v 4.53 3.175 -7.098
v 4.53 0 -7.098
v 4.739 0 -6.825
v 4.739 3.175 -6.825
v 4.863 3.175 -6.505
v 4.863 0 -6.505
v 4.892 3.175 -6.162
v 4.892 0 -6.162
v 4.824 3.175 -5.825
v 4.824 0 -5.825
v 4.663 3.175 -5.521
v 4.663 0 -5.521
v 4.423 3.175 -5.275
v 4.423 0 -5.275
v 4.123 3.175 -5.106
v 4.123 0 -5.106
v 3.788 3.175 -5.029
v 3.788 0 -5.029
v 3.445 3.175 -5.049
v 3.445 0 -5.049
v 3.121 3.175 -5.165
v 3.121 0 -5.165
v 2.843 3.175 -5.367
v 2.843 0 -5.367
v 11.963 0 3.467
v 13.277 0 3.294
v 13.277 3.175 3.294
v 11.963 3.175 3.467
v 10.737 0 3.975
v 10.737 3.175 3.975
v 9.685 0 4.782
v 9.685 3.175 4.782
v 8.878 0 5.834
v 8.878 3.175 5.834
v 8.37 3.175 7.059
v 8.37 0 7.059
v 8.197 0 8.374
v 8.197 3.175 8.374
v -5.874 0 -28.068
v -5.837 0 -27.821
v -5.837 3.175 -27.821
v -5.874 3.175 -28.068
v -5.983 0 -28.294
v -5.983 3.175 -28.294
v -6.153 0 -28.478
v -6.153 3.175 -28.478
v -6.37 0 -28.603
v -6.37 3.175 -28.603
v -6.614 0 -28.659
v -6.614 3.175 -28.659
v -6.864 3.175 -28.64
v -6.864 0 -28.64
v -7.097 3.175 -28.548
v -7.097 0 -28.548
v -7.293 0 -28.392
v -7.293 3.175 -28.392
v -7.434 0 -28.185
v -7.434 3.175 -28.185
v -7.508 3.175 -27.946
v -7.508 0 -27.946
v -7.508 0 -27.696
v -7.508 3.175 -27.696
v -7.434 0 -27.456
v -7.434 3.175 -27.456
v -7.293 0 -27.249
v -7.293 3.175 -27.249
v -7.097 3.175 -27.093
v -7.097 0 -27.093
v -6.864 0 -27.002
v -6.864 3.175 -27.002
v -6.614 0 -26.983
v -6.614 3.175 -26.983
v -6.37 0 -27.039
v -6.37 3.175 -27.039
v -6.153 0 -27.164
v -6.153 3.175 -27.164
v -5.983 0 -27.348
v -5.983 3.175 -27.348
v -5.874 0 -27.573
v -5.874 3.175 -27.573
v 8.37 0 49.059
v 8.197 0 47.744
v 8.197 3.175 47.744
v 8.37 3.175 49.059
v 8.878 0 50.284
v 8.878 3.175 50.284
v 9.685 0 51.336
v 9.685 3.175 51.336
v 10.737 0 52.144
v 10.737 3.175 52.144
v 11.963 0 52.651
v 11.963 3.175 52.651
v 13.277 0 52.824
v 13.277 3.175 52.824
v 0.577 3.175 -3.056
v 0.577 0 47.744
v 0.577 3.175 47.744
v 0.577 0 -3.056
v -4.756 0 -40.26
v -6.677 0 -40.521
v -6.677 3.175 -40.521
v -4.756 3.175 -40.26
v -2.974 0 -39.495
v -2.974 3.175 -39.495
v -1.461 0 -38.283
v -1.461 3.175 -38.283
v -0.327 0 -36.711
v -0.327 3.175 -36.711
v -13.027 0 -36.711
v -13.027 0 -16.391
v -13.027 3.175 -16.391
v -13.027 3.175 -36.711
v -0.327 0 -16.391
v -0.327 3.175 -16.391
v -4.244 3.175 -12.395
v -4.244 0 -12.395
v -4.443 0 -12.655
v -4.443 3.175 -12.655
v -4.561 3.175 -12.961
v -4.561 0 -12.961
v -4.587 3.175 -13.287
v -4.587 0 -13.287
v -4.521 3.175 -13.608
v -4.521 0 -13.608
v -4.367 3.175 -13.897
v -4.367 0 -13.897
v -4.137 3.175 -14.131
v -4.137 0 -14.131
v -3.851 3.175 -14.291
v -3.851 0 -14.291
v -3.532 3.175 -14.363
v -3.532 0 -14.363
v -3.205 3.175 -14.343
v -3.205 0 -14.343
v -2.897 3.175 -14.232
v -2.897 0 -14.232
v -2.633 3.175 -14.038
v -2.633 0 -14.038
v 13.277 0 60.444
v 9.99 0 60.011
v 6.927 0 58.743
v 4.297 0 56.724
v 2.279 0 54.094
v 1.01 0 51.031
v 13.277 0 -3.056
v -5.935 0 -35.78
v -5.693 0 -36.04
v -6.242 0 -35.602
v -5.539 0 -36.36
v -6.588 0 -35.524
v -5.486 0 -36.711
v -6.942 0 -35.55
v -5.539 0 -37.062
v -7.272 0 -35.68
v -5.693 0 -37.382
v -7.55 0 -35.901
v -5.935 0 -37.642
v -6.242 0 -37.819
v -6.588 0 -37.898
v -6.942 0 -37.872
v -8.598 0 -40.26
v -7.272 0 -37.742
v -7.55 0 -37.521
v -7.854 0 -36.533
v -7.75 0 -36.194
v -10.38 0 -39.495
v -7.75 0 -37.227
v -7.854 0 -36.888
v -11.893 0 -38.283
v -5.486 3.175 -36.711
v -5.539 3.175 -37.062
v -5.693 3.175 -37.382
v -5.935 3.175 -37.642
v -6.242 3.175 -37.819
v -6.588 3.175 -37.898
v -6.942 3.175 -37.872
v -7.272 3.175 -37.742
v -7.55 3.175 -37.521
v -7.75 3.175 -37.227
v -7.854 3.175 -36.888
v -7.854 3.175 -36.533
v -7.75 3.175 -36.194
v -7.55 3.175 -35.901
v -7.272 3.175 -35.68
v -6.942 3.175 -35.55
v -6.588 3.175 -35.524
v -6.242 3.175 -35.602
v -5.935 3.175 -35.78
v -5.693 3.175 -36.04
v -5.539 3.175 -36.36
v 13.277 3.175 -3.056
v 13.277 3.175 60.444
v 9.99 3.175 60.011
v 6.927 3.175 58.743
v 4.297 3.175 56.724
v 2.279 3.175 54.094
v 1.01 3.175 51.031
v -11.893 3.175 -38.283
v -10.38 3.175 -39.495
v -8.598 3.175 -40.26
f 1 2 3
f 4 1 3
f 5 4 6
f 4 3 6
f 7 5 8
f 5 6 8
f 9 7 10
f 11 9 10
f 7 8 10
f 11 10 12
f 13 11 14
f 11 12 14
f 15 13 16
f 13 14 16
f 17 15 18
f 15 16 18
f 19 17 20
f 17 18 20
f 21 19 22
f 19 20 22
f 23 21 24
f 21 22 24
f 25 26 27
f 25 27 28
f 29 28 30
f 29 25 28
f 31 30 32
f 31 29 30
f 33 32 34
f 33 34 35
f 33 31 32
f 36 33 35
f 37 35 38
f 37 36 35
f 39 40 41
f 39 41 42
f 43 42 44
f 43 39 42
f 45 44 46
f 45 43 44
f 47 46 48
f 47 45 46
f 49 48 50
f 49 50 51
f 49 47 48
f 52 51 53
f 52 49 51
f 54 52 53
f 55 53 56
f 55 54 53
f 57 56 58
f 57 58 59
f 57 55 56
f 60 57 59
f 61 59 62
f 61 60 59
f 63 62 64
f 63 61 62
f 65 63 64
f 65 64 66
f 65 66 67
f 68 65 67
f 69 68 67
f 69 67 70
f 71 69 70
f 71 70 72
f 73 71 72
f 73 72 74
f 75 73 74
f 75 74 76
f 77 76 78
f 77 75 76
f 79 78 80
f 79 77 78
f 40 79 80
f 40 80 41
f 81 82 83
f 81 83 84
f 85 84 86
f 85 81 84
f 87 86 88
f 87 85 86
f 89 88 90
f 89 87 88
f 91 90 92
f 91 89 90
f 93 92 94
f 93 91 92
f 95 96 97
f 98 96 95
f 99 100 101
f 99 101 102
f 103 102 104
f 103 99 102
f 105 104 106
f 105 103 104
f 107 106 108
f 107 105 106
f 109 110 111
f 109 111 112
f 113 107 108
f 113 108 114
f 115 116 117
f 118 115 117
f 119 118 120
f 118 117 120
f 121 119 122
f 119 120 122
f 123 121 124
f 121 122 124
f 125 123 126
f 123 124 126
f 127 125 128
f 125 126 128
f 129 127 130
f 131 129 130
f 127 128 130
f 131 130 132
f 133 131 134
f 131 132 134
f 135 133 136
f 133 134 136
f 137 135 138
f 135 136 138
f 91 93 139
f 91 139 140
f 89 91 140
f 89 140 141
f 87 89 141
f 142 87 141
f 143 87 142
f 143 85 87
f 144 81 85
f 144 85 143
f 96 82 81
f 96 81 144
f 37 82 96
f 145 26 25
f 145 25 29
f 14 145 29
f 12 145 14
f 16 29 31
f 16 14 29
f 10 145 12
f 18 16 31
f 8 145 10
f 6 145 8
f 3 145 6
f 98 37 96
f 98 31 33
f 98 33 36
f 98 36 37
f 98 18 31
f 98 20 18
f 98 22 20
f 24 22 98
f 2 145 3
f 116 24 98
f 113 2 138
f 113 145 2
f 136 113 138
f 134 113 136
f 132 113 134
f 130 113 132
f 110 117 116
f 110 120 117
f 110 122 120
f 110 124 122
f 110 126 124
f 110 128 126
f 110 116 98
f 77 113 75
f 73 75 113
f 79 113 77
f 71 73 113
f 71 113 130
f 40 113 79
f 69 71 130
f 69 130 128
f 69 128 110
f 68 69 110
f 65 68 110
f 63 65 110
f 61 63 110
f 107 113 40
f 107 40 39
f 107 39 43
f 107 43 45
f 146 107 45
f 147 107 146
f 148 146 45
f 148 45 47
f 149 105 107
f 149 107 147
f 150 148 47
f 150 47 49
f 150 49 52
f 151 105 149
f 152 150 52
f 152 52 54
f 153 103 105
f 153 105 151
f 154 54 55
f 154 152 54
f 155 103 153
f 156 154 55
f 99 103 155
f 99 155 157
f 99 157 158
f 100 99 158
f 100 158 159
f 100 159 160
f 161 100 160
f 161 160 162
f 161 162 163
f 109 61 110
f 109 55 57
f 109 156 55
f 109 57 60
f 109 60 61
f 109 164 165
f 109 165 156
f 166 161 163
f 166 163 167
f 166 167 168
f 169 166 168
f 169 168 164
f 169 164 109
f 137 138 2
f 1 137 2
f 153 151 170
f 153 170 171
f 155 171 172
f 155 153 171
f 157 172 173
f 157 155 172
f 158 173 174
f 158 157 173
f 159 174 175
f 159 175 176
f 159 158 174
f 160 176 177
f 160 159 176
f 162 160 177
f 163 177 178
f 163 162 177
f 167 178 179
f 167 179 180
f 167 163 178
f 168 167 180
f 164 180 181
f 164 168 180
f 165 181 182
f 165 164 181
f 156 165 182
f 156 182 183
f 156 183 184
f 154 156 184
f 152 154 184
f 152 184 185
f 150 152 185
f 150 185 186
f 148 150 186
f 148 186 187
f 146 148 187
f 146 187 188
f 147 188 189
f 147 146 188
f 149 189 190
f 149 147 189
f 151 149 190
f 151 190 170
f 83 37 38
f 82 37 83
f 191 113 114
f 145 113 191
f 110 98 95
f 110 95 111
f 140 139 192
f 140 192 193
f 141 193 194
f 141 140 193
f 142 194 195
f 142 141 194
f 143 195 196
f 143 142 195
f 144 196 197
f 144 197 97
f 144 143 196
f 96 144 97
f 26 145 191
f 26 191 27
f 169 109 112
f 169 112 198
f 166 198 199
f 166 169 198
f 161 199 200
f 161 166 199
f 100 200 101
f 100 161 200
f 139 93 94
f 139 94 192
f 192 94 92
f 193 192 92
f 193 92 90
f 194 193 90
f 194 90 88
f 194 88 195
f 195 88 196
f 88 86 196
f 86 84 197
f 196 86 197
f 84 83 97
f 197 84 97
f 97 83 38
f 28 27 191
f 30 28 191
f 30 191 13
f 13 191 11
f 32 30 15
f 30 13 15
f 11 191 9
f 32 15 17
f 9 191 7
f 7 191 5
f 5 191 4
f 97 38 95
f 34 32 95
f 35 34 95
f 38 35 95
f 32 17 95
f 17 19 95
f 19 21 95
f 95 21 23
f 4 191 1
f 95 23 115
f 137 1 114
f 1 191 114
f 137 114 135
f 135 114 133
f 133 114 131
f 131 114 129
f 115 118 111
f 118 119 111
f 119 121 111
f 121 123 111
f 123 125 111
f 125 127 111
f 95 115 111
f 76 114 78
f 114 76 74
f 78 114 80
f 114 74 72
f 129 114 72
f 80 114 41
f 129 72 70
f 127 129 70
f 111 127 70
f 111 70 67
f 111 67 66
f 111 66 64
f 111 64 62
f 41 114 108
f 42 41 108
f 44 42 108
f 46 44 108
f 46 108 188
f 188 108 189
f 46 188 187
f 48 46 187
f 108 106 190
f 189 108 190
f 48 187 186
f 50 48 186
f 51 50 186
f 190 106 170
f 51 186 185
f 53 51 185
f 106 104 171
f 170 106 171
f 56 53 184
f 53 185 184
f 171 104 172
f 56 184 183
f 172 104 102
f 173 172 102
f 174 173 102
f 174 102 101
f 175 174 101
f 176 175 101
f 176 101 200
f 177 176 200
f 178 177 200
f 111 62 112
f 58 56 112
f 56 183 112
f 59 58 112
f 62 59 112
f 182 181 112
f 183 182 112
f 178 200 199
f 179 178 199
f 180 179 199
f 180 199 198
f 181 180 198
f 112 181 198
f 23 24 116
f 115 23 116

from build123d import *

# Parameters (mm, degrees)
SKETCH1_R           = 0.840105
SKETCH1_R_2         = 1.190625
BOSS_EXTRUDE1_DEPTH = 3.175


with BuildPart() as part:
    # Sketch1 → Boss-Extrude1 (new body)
    with BuildSketch(Plane(origin=(0, 0, 0), x_dir=(1, 0, 0), z_dir=(0, 1, 0))):
        with BuildLine():
            Line((-13.027020503, 16.390799837), (-13.027020503, 36.710799837))
            ThreePointArc((-13.027020503, 36.710799837), (-10.379674956, 39.495223926), (-6.677020503, 40.520799837))
            ThreePointArc((-6.677020503, 40.520799837), (-2.974366049, 39.495223926), (-0.327020503, 36.710799837))
            Line((-0.327020503, 36.710799837), (-0.327020503, 16.390799837))
            Line((-0.327020503, 16.390799837), (13.277400654, 3.055799837))
            Line((13.277400654, 3.055799837), (13.277400654, -3.294200163))
            ThreePointArc((13.277400654, -3.294200163), (9.685298205, -4.782097715), (8.197400654, -8.374200163))
            Line((8.197400654, -8.374200163), (8.197400654, -47.744200163))
            ThreePointArc((8.197400654, -47.744200163), (9.685298205, -51.336302612), (13.277400654, -52.824200163))
            Line((13.277400654, -52.824200163), (13.277400654, -60.444200163))
            ThreePointArc((13.277400654, -60.444200163), (4.297144533, -56.724456284), (0.577400654, -47.744200163))
            Line((0.577400654, -47.744200163), (0.577400654, 3.055799837))
            Line((0.577400654, 3.055799837), (-13.027020503, 16.390799837))
        make_face()
        with Locations((-6.677020503, 27.820799837)):
            Circle(SKETCH1_R, mode=Mode.SUBTRACT)
        with Locations((-6.677020503, 36.710799837)):
            Circle(SKETCH1_R_2, mode=Mode.SUBTRACT)
        with BuildLine():
            Line((-2.63294069, 14.03829086), (4.529585854, 7.097736719))
            ThreePointArc((4.529585854, 7.097736719), (4.551571997, 5.389416502), (2.843251781, 5.367430359))
            Line((2.843251781, 5.367430359), (-4.24408648, 12.394593219))
            ThreePointArc((-4.24408648, 12.394593219), (-4.260362405, 14.022014935), (-2.63294069, 14.03829086))
        make_face(mode=Mode.SUBTRACT)
    extrude(amount=BOSS_EXTRUDE1_DEPTH)


solid = part.part
